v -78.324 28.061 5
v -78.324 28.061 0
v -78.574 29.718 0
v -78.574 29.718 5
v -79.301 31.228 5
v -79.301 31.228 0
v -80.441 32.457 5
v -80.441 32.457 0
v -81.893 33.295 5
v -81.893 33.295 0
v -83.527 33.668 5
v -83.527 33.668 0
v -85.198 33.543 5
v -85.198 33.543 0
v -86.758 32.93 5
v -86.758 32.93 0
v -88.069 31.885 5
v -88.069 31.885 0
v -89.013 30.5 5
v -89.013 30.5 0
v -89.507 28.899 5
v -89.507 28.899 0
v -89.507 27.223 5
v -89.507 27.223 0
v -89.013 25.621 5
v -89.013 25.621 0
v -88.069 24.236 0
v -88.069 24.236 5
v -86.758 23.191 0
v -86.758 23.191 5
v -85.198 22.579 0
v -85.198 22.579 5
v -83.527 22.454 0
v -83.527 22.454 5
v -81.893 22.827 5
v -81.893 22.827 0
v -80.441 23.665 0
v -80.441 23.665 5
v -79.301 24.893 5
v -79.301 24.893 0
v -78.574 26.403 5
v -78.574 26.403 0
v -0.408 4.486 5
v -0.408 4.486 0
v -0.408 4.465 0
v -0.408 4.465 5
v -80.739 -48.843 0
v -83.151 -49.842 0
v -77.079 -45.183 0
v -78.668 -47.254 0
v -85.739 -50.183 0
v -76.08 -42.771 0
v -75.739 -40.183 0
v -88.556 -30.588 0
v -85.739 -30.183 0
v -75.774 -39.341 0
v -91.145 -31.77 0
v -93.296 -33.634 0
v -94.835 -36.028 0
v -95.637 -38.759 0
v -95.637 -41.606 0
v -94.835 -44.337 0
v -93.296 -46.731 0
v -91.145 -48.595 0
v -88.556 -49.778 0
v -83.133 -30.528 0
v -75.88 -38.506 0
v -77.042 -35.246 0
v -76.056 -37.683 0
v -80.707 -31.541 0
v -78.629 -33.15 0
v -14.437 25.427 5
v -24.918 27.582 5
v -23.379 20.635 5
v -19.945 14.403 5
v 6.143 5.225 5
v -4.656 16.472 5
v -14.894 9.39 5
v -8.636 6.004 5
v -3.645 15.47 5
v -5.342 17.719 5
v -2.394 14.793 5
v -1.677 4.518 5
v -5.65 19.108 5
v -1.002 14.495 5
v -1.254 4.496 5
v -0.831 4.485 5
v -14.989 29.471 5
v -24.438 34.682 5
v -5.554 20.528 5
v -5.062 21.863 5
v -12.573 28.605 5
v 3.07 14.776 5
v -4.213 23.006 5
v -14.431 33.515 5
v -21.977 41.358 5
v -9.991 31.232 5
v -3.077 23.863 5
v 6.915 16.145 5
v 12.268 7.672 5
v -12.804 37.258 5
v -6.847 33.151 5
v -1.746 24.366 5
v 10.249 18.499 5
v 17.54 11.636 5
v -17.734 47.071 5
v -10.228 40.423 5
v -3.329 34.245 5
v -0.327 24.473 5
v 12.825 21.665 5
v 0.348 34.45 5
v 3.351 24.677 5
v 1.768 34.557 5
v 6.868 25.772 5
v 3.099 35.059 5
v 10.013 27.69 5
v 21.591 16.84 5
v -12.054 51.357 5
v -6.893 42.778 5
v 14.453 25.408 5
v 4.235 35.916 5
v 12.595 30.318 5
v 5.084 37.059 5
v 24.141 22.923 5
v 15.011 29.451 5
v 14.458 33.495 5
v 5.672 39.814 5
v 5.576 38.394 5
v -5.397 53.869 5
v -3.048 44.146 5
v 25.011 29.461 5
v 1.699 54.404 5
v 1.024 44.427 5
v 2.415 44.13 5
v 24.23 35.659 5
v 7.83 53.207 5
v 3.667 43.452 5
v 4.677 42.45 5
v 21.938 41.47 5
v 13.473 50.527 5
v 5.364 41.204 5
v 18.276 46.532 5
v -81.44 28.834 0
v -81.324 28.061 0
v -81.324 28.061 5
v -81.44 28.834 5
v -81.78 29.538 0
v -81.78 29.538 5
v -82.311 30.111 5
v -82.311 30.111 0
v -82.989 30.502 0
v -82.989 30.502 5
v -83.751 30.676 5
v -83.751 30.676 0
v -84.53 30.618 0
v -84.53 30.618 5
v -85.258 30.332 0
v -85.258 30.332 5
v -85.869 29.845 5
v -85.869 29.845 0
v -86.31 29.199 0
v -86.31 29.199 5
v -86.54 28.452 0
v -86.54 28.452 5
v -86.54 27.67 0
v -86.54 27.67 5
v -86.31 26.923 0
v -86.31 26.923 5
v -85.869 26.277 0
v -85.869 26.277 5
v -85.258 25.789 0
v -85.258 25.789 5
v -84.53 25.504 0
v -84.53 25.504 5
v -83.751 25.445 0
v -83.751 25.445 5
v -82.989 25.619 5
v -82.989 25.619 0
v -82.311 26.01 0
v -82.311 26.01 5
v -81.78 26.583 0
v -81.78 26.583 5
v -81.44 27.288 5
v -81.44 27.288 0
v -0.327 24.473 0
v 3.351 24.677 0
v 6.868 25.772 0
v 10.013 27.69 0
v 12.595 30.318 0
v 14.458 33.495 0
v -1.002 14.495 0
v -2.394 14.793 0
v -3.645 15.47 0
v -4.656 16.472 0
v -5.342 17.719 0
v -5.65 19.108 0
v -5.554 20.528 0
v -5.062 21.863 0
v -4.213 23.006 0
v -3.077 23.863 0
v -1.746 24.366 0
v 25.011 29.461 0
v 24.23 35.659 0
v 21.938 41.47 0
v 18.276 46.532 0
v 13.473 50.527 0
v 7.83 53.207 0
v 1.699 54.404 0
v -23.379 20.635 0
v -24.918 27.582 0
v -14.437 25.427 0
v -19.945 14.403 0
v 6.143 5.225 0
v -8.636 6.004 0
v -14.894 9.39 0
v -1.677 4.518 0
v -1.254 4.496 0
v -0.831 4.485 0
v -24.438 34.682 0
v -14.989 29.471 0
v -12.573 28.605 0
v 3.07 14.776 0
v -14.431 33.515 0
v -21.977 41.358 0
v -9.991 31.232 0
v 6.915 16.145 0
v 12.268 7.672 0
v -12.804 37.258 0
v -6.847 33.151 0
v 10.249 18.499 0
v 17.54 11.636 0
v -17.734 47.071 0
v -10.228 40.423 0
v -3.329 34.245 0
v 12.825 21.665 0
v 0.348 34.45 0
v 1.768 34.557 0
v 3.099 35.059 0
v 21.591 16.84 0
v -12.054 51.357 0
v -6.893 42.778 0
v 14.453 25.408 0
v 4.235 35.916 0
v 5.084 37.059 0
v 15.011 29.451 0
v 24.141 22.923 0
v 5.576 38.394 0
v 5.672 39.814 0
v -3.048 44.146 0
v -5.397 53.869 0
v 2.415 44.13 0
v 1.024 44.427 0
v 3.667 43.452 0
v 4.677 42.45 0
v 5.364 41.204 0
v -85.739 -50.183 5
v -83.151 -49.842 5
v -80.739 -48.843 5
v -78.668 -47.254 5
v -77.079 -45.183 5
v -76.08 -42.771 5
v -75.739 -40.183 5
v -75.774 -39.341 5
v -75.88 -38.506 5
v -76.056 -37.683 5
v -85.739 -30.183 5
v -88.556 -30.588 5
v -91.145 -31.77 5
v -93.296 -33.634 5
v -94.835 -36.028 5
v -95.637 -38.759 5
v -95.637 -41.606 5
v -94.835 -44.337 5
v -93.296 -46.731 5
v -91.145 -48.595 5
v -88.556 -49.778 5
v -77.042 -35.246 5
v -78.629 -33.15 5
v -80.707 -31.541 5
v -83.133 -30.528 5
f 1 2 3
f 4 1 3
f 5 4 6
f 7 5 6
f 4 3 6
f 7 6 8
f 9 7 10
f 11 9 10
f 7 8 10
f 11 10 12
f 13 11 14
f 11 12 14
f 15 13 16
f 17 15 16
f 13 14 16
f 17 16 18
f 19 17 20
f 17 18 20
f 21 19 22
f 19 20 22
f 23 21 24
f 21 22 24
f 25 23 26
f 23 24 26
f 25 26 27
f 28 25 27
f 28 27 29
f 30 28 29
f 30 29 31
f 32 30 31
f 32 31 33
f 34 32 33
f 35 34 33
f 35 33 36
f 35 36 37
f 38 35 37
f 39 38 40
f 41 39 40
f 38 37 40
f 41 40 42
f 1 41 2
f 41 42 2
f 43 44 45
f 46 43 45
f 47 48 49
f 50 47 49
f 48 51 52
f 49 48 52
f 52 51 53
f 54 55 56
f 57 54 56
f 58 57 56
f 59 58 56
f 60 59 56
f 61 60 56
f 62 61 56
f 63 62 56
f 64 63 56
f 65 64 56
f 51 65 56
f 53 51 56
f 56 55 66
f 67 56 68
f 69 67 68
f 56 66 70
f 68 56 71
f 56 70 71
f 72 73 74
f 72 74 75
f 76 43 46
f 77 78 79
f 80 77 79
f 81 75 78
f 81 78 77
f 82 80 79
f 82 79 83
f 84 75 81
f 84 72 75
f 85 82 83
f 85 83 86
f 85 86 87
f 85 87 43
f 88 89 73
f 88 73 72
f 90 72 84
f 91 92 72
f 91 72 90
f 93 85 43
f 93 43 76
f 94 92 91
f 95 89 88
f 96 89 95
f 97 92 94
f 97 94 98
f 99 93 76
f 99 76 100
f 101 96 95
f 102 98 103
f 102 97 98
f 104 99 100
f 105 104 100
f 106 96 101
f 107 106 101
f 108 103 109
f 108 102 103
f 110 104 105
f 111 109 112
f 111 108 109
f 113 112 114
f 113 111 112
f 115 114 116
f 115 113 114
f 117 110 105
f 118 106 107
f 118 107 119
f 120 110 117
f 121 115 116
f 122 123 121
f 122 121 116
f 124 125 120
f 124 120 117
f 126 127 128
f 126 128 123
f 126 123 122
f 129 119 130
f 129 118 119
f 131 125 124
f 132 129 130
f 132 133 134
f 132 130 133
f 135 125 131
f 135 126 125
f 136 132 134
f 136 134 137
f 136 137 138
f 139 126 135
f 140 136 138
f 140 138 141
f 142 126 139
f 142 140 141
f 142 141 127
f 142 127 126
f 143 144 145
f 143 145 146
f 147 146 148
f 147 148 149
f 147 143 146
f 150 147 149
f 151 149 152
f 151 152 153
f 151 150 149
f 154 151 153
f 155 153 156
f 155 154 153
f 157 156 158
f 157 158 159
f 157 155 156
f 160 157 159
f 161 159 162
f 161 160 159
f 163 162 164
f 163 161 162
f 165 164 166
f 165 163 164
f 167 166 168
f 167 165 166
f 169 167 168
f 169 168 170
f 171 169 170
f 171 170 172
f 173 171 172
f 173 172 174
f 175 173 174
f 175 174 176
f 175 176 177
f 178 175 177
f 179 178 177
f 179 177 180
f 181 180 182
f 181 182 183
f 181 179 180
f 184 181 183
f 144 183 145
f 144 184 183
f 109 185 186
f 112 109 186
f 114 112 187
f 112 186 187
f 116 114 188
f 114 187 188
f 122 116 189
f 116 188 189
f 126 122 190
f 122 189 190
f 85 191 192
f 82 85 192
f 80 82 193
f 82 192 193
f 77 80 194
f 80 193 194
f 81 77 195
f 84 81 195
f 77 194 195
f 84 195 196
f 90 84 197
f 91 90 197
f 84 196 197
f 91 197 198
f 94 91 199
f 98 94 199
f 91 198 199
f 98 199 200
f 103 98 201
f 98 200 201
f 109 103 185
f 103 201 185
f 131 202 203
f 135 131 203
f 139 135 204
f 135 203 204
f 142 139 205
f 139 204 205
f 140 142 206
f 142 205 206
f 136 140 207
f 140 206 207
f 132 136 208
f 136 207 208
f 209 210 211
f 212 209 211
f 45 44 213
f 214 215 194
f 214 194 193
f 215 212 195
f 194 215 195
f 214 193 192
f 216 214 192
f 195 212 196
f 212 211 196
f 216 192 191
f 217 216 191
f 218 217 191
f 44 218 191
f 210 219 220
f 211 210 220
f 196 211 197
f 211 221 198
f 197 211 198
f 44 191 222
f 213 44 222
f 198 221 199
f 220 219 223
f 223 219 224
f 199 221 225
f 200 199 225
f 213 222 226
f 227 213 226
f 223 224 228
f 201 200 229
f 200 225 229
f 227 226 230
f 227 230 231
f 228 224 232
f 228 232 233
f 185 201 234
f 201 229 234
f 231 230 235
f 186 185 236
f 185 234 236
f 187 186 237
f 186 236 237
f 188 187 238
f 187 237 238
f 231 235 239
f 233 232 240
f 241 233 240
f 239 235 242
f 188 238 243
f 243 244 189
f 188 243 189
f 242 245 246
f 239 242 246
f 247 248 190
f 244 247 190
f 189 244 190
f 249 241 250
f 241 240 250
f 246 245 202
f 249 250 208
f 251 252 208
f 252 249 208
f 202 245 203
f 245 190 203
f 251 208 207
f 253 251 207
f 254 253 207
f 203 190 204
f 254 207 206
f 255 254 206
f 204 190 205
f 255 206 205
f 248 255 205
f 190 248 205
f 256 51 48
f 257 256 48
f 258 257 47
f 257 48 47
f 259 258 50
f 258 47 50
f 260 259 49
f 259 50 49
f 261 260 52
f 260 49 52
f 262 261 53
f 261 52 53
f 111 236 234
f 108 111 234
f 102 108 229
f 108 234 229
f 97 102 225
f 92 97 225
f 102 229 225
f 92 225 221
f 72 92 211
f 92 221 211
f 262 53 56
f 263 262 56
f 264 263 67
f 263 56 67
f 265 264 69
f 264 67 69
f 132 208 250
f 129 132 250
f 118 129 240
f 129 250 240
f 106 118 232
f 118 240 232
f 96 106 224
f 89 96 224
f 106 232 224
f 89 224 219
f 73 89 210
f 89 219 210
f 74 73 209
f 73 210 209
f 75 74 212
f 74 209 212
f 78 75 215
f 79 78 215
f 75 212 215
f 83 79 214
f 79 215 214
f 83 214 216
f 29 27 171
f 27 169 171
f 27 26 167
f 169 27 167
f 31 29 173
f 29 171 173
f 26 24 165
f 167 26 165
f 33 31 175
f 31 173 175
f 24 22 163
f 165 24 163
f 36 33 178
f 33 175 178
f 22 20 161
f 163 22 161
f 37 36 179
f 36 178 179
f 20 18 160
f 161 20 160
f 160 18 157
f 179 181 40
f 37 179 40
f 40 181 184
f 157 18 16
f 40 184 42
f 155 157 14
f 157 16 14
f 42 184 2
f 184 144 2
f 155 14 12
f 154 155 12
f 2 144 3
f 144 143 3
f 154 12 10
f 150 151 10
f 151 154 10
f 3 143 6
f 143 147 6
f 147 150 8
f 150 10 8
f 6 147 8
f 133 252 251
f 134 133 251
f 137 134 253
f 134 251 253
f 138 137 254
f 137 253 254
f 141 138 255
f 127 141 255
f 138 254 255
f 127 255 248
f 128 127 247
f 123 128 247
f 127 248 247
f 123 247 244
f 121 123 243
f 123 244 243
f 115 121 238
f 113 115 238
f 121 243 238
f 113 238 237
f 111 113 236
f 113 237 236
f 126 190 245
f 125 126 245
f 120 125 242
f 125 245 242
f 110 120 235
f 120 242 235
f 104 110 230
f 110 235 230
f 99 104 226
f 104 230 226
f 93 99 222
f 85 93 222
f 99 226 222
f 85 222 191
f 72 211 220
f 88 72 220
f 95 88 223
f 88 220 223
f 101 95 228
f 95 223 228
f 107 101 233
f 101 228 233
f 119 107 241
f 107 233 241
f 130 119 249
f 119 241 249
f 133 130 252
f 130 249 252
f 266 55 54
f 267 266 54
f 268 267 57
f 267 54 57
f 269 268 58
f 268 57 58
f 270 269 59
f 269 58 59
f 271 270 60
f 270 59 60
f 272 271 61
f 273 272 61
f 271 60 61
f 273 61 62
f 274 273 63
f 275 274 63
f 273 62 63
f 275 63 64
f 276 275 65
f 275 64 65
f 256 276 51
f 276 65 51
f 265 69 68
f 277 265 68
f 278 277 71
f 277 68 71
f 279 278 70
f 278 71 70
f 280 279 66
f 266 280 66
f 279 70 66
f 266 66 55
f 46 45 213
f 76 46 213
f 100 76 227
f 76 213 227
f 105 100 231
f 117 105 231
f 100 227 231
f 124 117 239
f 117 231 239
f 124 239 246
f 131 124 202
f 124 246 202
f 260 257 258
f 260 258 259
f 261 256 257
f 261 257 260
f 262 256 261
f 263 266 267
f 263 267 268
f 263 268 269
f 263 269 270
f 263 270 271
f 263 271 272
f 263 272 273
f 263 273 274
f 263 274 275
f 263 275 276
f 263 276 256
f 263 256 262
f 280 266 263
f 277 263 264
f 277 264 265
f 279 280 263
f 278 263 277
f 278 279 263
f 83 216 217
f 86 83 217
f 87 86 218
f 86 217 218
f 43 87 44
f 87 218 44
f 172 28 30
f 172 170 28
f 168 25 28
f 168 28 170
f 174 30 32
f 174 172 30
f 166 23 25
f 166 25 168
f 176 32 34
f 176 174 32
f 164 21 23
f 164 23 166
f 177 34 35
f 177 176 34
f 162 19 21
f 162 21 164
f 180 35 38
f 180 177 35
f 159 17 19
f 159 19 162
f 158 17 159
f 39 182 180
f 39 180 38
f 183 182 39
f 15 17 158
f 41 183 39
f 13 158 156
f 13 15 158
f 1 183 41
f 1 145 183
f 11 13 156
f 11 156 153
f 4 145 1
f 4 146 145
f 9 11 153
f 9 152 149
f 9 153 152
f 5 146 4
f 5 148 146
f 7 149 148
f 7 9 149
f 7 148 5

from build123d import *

# Parameters (mm, degrees)
F0_R     = 5.622862
F0_R_2   = 2.622862
F1_DEPTH = 5


with BuildPart() as f1:
    # F0 (on Top) → F1 (new body)
    with BuildSketch(Plane.XY):
        with Locations((-83.946779, 28.06069)):
            Circle(F0_R)
        with Locations((-83.946779, 28.06069)):
            Circle(F0_R_2, mode=Mode.SUBTRACT)
        with BuildLine():
            ThreePointArc((-76.056312, -37.682603), (-79.615046, -32.276909), (-85.738771, -30.182603))
            ThreePointArc((-85.738771, -30.182603), (-80.738771, -35.182603), (-85.738771, -40.182603))
            ThreePointArc((-85.738771, -40.182603), (-90.738771, -45.182603), (-85.738771, -50.182603))
            ThreePointArc((-85.738771, -50.182603), (-78.667703, -47.253671), (-75.738771, -40.182603))
            ThreePointArc((-75.738771, -40.182603), (-75.818474, -38.92256), (-76.056312, -37.682603))
        make_face()
        with BuildLine():
            ThreePointArc((-85.738771, -40.182603), (-80.738771, -35.182603), (-85.738771, -30.182603))
            ThreePointArc((-85.738771, -30.182603), (-95.738771, -40.182603), (-85.738771, -50.182603))
            ThreePointArc((-85.738771, -50.182603), (-90.738771, -45.182603), (-85.738771, -40.182603))
        make_face()
        with BuildLine():
            ThreePointArc((15.429841, 42.199068), (17.8063, 20.333006), (-1.339583, 9.506769))
            ThreePointArc((-1.339583, 9.506769), (-10.641535, 20.159172), (0.010867, 29.461124))
            ThreePointArc((0.010867, 29.461124), (10.663269, 38.763077), (1.361316, 49.41548))
            ThreePointArc((1.361316, 49.41548), (-17.784567, 38.589243), (-15.408108, 16.723181))
            ThreePointArc((-15.408108, 16.723181), (-10.629699, 8.272704), (-1.677196, 4.518181))
            ThreePointArc((-1.677196, 4.518181), (-1.042922, 4.488725), (-0.40797, 4.486138))
            Line((-0.40797, 4.486138), (-0.408094, 4.464635))
            ThreePointArc((-0.408094, 4.464635), (17.539785, 11.635945), (25.010867, 29.461124))
            ThreePointArc((25.010867, 29.461124), (18.275608, 46.531544), (1.698928, 54.404068))
            ThreePointArc((1.698928, 54.404068), (10.651432, 50.649546), (15.429841, 42.199068))
        make_face()
        with BuildLine():
            ThreePointArc((0.348479, 34.449713), (-8.477869, 32.288206), (-14.436605, 25.427448))
            ThreePointArc((-14.436605, 25.427448), (-11.623869, 38.928592), (1.023704, 44.426891))
            ThreePointArc((1.023704, 44.426891), (5.67468, 39.10069), (0.348479, 34.449713))
        make_face(mode=Mode.SUBTRACT)
        with BuildLine():
            ThreePointArc((0.010867, 29.461124), (-10.641535, 20.159172), (-1.339583, 9.506769))
            ThreePointArc((-1.339583, 9.506769), (17.8063, 20.333006), (15.429841, 42.199068))
            ThreePointArc((15.429841, 42.199068), (10.651432, 50.649546), (1.698928, 54.404068))
            ThreePointArc((1.698928, 54.404068), (-24.932077, 31.149186), (-1.677196, 4.518181))
            ThreePointArc((-1.677196, 4.518181), (-10.629699, 8.272704), (-15.408108, 16.723181))
            ThreePointArc((-15.408108, 16.723181), (-17.784567, 38.589243), (1.361316, 49.41548))
            ThreePointArc((1.361316, 49.41548), (10.663269, 38.763077), (0.010867, 29.461124))
        make_face()
        with BuildLine():
            ThreePointArc((-0.326746, 24.472536), (8.499603, 26.634043), (14.458339, 33.494801))
            ThreePointArc((14.458339, 33.494801), (11.645602, 19.993657), (-1.00197, 14.495358))
            ThreePointArc((-1.00197, 14.495358), (-5.652947, 19.821559), (-0.326746, 24.472536))
        make_face(mode=Mode.SUBTRACT)
    extrude(amount=F1_DEPTH)


solid = f1.part
